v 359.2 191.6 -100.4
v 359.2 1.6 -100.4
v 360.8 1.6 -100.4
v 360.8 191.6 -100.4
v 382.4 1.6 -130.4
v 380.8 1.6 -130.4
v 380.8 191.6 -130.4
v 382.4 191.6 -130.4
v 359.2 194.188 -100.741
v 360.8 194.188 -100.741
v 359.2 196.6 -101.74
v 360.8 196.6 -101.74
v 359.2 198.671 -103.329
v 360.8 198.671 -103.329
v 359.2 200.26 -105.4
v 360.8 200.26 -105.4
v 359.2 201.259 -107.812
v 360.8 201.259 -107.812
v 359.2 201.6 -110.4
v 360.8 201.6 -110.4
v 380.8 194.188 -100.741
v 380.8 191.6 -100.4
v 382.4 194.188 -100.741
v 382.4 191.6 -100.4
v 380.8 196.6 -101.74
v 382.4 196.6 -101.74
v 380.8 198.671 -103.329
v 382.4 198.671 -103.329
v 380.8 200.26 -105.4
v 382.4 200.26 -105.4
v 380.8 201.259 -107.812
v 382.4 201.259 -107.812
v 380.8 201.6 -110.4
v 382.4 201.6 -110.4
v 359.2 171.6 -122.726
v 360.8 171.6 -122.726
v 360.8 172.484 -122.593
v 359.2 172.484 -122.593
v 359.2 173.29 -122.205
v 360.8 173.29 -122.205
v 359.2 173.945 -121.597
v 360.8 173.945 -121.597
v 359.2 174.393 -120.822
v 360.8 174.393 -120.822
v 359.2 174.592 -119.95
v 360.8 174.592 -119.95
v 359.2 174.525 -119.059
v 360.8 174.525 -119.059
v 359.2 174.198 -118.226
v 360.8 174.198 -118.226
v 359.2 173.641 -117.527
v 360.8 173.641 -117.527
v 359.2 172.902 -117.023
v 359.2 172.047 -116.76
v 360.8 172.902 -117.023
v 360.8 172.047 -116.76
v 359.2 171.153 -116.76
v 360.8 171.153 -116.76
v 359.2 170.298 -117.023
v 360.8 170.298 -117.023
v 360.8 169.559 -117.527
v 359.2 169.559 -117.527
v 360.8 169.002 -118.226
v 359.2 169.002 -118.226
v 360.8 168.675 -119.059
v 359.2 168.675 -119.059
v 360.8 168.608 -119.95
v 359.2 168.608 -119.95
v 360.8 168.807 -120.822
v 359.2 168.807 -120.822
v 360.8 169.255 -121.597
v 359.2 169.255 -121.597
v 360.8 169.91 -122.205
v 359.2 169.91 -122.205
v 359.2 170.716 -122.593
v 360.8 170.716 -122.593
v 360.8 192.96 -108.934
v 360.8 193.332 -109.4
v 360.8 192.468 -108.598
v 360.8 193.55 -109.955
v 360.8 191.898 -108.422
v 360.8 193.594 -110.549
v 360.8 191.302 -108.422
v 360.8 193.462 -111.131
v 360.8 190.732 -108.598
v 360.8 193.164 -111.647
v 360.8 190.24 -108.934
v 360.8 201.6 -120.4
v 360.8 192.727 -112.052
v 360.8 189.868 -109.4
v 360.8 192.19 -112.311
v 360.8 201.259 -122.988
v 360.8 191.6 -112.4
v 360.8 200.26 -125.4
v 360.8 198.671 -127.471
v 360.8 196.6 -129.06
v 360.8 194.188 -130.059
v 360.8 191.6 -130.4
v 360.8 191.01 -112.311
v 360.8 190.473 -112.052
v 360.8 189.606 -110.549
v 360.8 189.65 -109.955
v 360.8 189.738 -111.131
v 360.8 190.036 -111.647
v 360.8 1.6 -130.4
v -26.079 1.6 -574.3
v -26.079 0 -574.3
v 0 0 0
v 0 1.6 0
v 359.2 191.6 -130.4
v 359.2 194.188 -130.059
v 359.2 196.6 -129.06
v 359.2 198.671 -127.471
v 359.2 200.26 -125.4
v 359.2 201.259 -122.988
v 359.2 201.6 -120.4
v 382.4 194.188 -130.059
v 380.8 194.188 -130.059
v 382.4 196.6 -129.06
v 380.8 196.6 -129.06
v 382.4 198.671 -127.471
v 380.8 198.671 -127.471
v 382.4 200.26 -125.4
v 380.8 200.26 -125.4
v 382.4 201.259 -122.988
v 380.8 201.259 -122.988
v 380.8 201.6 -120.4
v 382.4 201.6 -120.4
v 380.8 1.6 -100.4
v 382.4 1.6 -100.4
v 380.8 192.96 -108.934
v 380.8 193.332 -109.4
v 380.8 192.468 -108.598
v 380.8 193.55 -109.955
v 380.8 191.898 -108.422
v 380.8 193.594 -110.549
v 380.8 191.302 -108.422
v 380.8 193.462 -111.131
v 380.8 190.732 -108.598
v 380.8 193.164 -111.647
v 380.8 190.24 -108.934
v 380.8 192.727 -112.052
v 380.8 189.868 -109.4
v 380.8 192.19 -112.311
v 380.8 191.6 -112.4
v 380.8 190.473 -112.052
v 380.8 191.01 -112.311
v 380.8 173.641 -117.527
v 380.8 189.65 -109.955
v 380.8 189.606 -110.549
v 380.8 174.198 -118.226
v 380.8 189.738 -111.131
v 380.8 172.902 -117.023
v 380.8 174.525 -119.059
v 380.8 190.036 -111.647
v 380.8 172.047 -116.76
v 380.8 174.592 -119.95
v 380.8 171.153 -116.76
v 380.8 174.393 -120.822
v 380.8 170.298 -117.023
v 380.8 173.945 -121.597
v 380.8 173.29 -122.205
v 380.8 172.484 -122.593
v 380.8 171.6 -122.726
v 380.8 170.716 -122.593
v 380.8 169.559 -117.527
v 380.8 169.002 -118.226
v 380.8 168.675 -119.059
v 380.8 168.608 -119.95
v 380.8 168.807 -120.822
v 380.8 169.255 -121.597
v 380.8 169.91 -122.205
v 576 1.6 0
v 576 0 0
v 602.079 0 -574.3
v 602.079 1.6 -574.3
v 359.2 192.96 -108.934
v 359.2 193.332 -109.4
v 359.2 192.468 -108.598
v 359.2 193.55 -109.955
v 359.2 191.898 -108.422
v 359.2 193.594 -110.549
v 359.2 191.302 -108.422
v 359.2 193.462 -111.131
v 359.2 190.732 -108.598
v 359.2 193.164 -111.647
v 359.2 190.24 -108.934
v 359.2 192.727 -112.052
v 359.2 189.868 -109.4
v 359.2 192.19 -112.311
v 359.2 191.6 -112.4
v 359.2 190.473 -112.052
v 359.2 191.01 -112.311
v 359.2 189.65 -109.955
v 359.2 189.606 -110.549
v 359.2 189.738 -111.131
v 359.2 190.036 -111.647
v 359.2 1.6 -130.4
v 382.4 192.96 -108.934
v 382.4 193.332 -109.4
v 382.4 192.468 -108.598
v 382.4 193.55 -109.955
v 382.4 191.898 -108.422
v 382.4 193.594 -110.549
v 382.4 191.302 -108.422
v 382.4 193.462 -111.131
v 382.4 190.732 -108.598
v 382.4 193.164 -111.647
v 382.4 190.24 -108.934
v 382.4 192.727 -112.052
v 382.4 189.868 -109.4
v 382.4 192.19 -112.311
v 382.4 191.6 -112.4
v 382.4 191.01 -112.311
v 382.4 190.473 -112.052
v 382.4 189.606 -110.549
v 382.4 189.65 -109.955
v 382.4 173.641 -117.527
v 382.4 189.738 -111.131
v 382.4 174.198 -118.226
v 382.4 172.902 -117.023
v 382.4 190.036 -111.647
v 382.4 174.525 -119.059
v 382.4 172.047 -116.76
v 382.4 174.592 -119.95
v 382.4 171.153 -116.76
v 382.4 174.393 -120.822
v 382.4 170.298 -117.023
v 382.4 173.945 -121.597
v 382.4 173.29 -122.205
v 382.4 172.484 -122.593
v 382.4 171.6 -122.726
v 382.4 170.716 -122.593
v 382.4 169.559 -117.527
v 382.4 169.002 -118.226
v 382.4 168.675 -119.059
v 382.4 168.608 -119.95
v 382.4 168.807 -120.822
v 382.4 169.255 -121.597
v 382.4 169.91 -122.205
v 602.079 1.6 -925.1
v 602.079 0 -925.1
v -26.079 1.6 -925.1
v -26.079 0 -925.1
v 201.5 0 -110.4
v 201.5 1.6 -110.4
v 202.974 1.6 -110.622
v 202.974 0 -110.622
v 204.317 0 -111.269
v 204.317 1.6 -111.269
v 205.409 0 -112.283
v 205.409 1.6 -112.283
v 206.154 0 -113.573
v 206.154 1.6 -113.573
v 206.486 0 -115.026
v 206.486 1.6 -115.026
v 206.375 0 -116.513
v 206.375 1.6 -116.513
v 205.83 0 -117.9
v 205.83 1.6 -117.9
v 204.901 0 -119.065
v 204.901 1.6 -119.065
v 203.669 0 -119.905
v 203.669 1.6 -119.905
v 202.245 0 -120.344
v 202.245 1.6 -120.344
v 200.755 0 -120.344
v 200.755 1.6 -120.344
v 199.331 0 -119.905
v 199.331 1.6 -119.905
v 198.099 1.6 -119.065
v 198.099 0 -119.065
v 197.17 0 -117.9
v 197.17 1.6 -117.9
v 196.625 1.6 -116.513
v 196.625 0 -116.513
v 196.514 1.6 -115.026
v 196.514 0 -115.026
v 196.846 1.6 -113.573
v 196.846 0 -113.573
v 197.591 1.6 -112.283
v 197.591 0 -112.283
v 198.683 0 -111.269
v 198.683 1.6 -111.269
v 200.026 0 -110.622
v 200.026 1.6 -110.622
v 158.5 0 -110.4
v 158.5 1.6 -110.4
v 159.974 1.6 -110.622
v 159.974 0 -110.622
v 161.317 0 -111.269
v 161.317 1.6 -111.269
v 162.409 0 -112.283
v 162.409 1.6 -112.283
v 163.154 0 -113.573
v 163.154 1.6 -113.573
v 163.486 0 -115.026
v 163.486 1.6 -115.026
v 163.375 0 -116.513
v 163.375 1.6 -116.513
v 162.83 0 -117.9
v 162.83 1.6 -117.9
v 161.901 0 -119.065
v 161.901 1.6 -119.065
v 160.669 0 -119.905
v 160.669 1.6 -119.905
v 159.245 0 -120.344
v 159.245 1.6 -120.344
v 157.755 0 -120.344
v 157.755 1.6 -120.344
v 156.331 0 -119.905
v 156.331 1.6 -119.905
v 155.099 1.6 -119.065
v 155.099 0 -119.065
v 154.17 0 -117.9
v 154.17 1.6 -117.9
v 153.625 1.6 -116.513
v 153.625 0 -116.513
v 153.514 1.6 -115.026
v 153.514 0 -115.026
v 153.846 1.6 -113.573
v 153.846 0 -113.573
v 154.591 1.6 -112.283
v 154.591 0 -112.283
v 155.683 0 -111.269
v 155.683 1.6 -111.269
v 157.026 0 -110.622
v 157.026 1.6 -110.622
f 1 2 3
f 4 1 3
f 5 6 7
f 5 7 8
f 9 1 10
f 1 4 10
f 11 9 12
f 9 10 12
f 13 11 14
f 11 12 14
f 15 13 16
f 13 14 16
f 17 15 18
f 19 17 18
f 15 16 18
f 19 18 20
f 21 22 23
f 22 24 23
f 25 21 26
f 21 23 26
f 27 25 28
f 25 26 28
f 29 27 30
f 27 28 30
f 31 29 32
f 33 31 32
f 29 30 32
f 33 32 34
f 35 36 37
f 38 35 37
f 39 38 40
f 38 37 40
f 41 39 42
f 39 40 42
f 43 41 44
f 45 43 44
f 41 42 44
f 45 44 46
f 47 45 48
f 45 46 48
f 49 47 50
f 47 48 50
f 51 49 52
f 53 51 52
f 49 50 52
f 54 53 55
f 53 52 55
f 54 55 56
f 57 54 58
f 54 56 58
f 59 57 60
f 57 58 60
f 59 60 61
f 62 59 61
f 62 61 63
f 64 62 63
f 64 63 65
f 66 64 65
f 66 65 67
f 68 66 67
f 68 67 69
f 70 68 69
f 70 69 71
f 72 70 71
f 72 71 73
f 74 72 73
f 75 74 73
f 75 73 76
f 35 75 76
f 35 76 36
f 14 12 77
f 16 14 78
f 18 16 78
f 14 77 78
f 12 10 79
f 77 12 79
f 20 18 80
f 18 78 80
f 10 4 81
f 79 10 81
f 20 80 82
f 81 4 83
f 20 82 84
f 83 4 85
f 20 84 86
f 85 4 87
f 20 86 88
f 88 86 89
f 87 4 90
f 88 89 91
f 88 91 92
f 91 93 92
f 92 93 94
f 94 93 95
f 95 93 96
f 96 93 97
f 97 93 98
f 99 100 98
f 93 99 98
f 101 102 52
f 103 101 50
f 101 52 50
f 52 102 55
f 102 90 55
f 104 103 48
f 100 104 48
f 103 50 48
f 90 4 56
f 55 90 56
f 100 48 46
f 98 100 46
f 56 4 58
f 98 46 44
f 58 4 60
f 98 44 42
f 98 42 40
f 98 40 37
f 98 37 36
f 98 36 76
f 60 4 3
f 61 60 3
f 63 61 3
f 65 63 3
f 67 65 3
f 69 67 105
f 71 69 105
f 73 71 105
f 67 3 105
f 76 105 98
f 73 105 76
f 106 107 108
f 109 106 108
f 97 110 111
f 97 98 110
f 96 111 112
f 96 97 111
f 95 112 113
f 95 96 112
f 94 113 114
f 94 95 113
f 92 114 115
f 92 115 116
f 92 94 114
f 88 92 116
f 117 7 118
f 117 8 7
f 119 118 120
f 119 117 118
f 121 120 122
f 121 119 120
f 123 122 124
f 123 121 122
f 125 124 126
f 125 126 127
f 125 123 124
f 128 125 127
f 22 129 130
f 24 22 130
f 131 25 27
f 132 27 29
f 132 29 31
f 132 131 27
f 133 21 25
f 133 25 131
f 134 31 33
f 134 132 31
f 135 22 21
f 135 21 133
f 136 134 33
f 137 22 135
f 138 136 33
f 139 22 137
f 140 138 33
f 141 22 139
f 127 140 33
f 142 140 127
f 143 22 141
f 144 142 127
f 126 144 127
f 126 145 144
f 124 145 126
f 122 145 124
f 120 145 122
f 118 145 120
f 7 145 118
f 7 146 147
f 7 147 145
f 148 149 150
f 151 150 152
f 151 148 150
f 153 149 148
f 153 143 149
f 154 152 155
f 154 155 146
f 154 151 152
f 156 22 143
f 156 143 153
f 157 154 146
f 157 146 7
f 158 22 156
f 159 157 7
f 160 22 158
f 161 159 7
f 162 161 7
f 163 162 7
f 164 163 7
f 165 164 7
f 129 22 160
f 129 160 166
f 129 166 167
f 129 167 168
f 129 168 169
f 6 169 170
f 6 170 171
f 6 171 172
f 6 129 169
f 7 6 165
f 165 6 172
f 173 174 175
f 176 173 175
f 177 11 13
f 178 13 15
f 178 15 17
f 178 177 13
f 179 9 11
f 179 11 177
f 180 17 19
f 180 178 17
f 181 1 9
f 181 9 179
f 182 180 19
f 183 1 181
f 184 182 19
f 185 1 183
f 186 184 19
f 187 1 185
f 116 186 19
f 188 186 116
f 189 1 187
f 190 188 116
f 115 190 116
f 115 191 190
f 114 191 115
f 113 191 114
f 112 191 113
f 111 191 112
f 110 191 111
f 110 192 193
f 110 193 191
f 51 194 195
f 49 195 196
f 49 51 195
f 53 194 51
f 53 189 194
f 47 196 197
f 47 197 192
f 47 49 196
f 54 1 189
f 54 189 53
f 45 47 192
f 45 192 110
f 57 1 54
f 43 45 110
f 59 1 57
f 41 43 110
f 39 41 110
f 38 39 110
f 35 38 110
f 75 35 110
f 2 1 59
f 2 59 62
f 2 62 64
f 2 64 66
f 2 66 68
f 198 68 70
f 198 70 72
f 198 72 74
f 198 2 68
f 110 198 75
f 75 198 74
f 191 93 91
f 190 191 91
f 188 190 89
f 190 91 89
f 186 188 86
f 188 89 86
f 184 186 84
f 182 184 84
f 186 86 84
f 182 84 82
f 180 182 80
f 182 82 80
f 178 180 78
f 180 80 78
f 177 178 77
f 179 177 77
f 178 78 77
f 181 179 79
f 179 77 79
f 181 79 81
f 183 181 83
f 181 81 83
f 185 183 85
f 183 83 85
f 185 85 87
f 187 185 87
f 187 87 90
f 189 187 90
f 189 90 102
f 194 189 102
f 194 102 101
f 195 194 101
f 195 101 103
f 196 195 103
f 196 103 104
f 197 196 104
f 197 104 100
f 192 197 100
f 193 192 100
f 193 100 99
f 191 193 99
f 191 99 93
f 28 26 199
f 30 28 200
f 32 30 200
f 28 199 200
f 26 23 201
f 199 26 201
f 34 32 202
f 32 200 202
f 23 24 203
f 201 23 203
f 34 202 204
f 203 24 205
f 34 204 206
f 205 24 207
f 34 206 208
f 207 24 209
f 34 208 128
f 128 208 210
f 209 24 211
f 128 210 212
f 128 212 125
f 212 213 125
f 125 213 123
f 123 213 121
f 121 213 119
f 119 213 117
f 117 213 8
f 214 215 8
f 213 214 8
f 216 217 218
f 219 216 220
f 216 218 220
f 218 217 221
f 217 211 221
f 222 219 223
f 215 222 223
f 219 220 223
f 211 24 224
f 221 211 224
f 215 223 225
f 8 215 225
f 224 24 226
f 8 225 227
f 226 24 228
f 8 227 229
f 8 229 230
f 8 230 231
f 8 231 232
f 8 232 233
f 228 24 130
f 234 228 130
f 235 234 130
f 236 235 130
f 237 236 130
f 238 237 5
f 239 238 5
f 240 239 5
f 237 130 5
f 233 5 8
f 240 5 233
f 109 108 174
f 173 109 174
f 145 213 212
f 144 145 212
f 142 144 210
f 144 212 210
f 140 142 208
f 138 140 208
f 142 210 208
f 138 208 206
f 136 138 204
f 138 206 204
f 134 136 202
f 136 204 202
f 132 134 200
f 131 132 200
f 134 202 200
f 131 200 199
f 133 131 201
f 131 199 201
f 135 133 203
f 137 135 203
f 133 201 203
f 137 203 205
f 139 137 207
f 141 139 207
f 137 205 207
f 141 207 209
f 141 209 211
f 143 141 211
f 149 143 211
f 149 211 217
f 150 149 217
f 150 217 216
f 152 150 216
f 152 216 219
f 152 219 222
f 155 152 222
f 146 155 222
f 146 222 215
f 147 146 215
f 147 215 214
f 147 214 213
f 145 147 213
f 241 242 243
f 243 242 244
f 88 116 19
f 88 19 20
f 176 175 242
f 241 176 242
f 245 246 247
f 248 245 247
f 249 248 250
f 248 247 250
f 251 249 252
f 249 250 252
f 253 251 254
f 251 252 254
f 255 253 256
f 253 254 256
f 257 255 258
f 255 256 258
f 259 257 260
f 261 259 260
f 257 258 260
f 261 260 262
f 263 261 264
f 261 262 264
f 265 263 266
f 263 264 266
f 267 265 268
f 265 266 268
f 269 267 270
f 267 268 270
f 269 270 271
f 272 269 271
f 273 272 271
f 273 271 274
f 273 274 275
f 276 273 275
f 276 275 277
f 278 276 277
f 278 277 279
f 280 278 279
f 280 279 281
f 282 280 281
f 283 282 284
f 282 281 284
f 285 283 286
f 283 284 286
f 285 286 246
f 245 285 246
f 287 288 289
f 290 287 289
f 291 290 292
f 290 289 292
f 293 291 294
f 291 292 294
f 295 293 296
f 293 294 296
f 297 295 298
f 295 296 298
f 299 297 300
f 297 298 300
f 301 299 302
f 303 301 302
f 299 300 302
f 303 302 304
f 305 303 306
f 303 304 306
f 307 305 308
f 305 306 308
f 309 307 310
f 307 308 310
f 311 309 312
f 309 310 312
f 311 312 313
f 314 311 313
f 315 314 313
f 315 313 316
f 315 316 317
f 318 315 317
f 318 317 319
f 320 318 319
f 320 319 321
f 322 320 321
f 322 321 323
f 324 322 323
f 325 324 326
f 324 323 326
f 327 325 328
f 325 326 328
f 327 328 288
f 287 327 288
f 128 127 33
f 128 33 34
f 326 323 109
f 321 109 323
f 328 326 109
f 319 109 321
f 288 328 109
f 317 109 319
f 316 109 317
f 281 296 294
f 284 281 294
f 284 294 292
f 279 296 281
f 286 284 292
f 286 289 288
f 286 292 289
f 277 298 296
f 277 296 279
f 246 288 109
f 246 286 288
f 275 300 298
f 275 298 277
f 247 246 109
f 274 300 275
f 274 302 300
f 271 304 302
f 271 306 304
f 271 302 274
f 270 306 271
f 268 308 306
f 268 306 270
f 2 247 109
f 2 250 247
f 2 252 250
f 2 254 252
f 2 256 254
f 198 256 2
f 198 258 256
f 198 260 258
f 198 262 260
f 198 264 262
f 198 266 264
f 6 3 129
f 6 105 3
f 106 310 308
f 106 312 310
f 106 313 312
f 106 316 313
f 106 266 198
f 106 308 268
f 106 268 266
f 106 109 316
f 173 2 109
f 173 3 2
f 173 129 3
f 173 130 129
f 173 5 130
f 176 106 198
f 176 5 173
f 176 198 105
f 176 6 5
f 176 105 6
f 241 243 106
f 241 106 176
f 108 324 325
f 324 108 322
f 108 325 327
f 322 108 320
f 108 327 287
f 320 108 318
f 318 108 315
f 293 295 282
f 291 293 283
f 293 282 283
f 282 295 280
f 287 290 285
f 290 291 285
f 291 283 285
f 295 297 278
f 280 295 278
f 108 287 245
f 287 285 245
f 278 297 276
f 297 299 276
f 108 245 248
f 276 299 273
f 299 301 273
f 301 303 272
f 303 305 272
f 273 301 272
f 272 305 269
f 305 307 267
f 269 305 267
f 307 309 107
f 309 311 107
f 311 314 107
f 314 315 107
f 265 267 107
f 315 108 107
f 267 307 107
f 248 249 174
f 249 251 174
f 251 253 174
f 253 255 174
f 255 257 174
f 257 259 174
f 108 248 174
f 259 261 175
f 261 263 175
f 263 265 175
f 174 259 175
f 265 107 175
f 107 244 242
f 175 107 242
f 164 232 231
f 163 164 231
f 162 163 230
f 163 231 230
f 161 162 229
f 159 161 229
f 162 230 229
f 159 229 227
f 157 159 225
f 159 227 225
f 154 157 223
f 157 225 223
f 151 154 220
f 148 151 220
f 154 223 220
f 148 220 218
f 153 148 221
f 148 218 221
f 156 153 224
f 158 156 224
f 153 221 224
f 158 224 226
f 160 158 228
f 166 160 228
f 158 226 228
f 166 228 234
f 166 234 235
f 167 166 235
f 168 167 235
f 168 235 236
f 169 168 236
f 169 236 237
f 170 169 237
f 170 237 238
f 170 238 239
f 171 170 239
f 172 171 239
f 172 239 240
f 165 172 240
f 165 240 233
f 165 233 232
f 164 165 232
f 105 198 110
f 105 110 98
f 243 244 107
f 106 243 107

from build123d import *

# Parameters (mm, degrees)
BOSS_EXTRUDE1_DEPTH = 1.6
SKETCH2_R           = 5
CUT_EXTRUDE1_DEPTH  = 1.6
SKETCH3_W           = 1.6
SKETCH3_H           = 30
BOSS_EXTRUDE2_DEPTH = 200
SKETCH4_R           = 2
SKETCH4_R_2         = 3
CUT_EXTRUDE2_DEPTH  = 1032.168031188
FILLET1_R           = 10


with BuildPart() as part:
    # Sketch1 → Boss-Extrude1 (new body)
    with BuildSketch(Plane(origin=(0, 0, 0), x_dir=(1, 0, 0), z_dir=(0, 1, 0))):
        Polygon((0, 0), (576, 0), (602.078810398, 574.3), (602.078810398, 925.1), (-26.078810398, 925.1), (-26.078810398, 574.3), align=None)
    extrude(amount=BOSS_EXTRUDE1_DEPTH)

    # Sketch2 → Cut-Extrude1 (cut)
    with BuildSketch(Plane(origin=(0, 1.6, 0), x_dir=(1, 0, 0), z_dir=(0, 1, 0))):
        with Locations(Location((201.5, 115.4, 0), (0, 0, 270))):
            Circle(SKETCH2_R)
        with Locations(Location((158.5, 115.4, 0), (0, 0, 270))):
            Circle(SKETCH2_R)
    extrude(amount=-CUT_EXTRUDE1_DEPTH, mode=Mode.SUBTRACT)

    # Sketch3 → Boss-Extrude2 (add)
    with BuildSketch(Plane(origin=(0, 1.6, 0), x_dir=(1, 0, 0), z_dir=(0, 1, 0))):
        with Locations((360, 115.4)):
            Rectangle(SKETCH3_W, SKETCH3_H)
        with Locations((381.6, 115.4)):
            Rectangle(SKETCH3_W, SKETCH3_H)
    extrude(amount=BOSS_EXTRUDE2_DEPTH)

    # Sketch4 → Cut-Extrude2 (cut, through all)
    with BuildSketch(Plane(origin=(382.4, 0, 0), x_dir=(0, 0, -1), z_dir=(1, 0, 0))):
        with Locations((110.4, 191.6)):
            Circle(SKETCH4_R)
        with Locations((119.726153163, 171.6)):
            Circle(SKETCH4_R_2)
    extrude(amount=-CUT_EXTRUDE2_DEPTH, mode=Mode.SUBTRACT)

    # Fillet1
    fillet1_edges = [part.edges().sort_by_distance(p)[0] for p in [
        (360, 201.6, -130.4),
        (360, 201.6, -100.4),
        (381.6, 201.6, -130.4),
        (381.6, 201.6, -100.4),
    ]]
    fillet(fillet1_edges, radius=FILLET1_R)


solid = part.part
